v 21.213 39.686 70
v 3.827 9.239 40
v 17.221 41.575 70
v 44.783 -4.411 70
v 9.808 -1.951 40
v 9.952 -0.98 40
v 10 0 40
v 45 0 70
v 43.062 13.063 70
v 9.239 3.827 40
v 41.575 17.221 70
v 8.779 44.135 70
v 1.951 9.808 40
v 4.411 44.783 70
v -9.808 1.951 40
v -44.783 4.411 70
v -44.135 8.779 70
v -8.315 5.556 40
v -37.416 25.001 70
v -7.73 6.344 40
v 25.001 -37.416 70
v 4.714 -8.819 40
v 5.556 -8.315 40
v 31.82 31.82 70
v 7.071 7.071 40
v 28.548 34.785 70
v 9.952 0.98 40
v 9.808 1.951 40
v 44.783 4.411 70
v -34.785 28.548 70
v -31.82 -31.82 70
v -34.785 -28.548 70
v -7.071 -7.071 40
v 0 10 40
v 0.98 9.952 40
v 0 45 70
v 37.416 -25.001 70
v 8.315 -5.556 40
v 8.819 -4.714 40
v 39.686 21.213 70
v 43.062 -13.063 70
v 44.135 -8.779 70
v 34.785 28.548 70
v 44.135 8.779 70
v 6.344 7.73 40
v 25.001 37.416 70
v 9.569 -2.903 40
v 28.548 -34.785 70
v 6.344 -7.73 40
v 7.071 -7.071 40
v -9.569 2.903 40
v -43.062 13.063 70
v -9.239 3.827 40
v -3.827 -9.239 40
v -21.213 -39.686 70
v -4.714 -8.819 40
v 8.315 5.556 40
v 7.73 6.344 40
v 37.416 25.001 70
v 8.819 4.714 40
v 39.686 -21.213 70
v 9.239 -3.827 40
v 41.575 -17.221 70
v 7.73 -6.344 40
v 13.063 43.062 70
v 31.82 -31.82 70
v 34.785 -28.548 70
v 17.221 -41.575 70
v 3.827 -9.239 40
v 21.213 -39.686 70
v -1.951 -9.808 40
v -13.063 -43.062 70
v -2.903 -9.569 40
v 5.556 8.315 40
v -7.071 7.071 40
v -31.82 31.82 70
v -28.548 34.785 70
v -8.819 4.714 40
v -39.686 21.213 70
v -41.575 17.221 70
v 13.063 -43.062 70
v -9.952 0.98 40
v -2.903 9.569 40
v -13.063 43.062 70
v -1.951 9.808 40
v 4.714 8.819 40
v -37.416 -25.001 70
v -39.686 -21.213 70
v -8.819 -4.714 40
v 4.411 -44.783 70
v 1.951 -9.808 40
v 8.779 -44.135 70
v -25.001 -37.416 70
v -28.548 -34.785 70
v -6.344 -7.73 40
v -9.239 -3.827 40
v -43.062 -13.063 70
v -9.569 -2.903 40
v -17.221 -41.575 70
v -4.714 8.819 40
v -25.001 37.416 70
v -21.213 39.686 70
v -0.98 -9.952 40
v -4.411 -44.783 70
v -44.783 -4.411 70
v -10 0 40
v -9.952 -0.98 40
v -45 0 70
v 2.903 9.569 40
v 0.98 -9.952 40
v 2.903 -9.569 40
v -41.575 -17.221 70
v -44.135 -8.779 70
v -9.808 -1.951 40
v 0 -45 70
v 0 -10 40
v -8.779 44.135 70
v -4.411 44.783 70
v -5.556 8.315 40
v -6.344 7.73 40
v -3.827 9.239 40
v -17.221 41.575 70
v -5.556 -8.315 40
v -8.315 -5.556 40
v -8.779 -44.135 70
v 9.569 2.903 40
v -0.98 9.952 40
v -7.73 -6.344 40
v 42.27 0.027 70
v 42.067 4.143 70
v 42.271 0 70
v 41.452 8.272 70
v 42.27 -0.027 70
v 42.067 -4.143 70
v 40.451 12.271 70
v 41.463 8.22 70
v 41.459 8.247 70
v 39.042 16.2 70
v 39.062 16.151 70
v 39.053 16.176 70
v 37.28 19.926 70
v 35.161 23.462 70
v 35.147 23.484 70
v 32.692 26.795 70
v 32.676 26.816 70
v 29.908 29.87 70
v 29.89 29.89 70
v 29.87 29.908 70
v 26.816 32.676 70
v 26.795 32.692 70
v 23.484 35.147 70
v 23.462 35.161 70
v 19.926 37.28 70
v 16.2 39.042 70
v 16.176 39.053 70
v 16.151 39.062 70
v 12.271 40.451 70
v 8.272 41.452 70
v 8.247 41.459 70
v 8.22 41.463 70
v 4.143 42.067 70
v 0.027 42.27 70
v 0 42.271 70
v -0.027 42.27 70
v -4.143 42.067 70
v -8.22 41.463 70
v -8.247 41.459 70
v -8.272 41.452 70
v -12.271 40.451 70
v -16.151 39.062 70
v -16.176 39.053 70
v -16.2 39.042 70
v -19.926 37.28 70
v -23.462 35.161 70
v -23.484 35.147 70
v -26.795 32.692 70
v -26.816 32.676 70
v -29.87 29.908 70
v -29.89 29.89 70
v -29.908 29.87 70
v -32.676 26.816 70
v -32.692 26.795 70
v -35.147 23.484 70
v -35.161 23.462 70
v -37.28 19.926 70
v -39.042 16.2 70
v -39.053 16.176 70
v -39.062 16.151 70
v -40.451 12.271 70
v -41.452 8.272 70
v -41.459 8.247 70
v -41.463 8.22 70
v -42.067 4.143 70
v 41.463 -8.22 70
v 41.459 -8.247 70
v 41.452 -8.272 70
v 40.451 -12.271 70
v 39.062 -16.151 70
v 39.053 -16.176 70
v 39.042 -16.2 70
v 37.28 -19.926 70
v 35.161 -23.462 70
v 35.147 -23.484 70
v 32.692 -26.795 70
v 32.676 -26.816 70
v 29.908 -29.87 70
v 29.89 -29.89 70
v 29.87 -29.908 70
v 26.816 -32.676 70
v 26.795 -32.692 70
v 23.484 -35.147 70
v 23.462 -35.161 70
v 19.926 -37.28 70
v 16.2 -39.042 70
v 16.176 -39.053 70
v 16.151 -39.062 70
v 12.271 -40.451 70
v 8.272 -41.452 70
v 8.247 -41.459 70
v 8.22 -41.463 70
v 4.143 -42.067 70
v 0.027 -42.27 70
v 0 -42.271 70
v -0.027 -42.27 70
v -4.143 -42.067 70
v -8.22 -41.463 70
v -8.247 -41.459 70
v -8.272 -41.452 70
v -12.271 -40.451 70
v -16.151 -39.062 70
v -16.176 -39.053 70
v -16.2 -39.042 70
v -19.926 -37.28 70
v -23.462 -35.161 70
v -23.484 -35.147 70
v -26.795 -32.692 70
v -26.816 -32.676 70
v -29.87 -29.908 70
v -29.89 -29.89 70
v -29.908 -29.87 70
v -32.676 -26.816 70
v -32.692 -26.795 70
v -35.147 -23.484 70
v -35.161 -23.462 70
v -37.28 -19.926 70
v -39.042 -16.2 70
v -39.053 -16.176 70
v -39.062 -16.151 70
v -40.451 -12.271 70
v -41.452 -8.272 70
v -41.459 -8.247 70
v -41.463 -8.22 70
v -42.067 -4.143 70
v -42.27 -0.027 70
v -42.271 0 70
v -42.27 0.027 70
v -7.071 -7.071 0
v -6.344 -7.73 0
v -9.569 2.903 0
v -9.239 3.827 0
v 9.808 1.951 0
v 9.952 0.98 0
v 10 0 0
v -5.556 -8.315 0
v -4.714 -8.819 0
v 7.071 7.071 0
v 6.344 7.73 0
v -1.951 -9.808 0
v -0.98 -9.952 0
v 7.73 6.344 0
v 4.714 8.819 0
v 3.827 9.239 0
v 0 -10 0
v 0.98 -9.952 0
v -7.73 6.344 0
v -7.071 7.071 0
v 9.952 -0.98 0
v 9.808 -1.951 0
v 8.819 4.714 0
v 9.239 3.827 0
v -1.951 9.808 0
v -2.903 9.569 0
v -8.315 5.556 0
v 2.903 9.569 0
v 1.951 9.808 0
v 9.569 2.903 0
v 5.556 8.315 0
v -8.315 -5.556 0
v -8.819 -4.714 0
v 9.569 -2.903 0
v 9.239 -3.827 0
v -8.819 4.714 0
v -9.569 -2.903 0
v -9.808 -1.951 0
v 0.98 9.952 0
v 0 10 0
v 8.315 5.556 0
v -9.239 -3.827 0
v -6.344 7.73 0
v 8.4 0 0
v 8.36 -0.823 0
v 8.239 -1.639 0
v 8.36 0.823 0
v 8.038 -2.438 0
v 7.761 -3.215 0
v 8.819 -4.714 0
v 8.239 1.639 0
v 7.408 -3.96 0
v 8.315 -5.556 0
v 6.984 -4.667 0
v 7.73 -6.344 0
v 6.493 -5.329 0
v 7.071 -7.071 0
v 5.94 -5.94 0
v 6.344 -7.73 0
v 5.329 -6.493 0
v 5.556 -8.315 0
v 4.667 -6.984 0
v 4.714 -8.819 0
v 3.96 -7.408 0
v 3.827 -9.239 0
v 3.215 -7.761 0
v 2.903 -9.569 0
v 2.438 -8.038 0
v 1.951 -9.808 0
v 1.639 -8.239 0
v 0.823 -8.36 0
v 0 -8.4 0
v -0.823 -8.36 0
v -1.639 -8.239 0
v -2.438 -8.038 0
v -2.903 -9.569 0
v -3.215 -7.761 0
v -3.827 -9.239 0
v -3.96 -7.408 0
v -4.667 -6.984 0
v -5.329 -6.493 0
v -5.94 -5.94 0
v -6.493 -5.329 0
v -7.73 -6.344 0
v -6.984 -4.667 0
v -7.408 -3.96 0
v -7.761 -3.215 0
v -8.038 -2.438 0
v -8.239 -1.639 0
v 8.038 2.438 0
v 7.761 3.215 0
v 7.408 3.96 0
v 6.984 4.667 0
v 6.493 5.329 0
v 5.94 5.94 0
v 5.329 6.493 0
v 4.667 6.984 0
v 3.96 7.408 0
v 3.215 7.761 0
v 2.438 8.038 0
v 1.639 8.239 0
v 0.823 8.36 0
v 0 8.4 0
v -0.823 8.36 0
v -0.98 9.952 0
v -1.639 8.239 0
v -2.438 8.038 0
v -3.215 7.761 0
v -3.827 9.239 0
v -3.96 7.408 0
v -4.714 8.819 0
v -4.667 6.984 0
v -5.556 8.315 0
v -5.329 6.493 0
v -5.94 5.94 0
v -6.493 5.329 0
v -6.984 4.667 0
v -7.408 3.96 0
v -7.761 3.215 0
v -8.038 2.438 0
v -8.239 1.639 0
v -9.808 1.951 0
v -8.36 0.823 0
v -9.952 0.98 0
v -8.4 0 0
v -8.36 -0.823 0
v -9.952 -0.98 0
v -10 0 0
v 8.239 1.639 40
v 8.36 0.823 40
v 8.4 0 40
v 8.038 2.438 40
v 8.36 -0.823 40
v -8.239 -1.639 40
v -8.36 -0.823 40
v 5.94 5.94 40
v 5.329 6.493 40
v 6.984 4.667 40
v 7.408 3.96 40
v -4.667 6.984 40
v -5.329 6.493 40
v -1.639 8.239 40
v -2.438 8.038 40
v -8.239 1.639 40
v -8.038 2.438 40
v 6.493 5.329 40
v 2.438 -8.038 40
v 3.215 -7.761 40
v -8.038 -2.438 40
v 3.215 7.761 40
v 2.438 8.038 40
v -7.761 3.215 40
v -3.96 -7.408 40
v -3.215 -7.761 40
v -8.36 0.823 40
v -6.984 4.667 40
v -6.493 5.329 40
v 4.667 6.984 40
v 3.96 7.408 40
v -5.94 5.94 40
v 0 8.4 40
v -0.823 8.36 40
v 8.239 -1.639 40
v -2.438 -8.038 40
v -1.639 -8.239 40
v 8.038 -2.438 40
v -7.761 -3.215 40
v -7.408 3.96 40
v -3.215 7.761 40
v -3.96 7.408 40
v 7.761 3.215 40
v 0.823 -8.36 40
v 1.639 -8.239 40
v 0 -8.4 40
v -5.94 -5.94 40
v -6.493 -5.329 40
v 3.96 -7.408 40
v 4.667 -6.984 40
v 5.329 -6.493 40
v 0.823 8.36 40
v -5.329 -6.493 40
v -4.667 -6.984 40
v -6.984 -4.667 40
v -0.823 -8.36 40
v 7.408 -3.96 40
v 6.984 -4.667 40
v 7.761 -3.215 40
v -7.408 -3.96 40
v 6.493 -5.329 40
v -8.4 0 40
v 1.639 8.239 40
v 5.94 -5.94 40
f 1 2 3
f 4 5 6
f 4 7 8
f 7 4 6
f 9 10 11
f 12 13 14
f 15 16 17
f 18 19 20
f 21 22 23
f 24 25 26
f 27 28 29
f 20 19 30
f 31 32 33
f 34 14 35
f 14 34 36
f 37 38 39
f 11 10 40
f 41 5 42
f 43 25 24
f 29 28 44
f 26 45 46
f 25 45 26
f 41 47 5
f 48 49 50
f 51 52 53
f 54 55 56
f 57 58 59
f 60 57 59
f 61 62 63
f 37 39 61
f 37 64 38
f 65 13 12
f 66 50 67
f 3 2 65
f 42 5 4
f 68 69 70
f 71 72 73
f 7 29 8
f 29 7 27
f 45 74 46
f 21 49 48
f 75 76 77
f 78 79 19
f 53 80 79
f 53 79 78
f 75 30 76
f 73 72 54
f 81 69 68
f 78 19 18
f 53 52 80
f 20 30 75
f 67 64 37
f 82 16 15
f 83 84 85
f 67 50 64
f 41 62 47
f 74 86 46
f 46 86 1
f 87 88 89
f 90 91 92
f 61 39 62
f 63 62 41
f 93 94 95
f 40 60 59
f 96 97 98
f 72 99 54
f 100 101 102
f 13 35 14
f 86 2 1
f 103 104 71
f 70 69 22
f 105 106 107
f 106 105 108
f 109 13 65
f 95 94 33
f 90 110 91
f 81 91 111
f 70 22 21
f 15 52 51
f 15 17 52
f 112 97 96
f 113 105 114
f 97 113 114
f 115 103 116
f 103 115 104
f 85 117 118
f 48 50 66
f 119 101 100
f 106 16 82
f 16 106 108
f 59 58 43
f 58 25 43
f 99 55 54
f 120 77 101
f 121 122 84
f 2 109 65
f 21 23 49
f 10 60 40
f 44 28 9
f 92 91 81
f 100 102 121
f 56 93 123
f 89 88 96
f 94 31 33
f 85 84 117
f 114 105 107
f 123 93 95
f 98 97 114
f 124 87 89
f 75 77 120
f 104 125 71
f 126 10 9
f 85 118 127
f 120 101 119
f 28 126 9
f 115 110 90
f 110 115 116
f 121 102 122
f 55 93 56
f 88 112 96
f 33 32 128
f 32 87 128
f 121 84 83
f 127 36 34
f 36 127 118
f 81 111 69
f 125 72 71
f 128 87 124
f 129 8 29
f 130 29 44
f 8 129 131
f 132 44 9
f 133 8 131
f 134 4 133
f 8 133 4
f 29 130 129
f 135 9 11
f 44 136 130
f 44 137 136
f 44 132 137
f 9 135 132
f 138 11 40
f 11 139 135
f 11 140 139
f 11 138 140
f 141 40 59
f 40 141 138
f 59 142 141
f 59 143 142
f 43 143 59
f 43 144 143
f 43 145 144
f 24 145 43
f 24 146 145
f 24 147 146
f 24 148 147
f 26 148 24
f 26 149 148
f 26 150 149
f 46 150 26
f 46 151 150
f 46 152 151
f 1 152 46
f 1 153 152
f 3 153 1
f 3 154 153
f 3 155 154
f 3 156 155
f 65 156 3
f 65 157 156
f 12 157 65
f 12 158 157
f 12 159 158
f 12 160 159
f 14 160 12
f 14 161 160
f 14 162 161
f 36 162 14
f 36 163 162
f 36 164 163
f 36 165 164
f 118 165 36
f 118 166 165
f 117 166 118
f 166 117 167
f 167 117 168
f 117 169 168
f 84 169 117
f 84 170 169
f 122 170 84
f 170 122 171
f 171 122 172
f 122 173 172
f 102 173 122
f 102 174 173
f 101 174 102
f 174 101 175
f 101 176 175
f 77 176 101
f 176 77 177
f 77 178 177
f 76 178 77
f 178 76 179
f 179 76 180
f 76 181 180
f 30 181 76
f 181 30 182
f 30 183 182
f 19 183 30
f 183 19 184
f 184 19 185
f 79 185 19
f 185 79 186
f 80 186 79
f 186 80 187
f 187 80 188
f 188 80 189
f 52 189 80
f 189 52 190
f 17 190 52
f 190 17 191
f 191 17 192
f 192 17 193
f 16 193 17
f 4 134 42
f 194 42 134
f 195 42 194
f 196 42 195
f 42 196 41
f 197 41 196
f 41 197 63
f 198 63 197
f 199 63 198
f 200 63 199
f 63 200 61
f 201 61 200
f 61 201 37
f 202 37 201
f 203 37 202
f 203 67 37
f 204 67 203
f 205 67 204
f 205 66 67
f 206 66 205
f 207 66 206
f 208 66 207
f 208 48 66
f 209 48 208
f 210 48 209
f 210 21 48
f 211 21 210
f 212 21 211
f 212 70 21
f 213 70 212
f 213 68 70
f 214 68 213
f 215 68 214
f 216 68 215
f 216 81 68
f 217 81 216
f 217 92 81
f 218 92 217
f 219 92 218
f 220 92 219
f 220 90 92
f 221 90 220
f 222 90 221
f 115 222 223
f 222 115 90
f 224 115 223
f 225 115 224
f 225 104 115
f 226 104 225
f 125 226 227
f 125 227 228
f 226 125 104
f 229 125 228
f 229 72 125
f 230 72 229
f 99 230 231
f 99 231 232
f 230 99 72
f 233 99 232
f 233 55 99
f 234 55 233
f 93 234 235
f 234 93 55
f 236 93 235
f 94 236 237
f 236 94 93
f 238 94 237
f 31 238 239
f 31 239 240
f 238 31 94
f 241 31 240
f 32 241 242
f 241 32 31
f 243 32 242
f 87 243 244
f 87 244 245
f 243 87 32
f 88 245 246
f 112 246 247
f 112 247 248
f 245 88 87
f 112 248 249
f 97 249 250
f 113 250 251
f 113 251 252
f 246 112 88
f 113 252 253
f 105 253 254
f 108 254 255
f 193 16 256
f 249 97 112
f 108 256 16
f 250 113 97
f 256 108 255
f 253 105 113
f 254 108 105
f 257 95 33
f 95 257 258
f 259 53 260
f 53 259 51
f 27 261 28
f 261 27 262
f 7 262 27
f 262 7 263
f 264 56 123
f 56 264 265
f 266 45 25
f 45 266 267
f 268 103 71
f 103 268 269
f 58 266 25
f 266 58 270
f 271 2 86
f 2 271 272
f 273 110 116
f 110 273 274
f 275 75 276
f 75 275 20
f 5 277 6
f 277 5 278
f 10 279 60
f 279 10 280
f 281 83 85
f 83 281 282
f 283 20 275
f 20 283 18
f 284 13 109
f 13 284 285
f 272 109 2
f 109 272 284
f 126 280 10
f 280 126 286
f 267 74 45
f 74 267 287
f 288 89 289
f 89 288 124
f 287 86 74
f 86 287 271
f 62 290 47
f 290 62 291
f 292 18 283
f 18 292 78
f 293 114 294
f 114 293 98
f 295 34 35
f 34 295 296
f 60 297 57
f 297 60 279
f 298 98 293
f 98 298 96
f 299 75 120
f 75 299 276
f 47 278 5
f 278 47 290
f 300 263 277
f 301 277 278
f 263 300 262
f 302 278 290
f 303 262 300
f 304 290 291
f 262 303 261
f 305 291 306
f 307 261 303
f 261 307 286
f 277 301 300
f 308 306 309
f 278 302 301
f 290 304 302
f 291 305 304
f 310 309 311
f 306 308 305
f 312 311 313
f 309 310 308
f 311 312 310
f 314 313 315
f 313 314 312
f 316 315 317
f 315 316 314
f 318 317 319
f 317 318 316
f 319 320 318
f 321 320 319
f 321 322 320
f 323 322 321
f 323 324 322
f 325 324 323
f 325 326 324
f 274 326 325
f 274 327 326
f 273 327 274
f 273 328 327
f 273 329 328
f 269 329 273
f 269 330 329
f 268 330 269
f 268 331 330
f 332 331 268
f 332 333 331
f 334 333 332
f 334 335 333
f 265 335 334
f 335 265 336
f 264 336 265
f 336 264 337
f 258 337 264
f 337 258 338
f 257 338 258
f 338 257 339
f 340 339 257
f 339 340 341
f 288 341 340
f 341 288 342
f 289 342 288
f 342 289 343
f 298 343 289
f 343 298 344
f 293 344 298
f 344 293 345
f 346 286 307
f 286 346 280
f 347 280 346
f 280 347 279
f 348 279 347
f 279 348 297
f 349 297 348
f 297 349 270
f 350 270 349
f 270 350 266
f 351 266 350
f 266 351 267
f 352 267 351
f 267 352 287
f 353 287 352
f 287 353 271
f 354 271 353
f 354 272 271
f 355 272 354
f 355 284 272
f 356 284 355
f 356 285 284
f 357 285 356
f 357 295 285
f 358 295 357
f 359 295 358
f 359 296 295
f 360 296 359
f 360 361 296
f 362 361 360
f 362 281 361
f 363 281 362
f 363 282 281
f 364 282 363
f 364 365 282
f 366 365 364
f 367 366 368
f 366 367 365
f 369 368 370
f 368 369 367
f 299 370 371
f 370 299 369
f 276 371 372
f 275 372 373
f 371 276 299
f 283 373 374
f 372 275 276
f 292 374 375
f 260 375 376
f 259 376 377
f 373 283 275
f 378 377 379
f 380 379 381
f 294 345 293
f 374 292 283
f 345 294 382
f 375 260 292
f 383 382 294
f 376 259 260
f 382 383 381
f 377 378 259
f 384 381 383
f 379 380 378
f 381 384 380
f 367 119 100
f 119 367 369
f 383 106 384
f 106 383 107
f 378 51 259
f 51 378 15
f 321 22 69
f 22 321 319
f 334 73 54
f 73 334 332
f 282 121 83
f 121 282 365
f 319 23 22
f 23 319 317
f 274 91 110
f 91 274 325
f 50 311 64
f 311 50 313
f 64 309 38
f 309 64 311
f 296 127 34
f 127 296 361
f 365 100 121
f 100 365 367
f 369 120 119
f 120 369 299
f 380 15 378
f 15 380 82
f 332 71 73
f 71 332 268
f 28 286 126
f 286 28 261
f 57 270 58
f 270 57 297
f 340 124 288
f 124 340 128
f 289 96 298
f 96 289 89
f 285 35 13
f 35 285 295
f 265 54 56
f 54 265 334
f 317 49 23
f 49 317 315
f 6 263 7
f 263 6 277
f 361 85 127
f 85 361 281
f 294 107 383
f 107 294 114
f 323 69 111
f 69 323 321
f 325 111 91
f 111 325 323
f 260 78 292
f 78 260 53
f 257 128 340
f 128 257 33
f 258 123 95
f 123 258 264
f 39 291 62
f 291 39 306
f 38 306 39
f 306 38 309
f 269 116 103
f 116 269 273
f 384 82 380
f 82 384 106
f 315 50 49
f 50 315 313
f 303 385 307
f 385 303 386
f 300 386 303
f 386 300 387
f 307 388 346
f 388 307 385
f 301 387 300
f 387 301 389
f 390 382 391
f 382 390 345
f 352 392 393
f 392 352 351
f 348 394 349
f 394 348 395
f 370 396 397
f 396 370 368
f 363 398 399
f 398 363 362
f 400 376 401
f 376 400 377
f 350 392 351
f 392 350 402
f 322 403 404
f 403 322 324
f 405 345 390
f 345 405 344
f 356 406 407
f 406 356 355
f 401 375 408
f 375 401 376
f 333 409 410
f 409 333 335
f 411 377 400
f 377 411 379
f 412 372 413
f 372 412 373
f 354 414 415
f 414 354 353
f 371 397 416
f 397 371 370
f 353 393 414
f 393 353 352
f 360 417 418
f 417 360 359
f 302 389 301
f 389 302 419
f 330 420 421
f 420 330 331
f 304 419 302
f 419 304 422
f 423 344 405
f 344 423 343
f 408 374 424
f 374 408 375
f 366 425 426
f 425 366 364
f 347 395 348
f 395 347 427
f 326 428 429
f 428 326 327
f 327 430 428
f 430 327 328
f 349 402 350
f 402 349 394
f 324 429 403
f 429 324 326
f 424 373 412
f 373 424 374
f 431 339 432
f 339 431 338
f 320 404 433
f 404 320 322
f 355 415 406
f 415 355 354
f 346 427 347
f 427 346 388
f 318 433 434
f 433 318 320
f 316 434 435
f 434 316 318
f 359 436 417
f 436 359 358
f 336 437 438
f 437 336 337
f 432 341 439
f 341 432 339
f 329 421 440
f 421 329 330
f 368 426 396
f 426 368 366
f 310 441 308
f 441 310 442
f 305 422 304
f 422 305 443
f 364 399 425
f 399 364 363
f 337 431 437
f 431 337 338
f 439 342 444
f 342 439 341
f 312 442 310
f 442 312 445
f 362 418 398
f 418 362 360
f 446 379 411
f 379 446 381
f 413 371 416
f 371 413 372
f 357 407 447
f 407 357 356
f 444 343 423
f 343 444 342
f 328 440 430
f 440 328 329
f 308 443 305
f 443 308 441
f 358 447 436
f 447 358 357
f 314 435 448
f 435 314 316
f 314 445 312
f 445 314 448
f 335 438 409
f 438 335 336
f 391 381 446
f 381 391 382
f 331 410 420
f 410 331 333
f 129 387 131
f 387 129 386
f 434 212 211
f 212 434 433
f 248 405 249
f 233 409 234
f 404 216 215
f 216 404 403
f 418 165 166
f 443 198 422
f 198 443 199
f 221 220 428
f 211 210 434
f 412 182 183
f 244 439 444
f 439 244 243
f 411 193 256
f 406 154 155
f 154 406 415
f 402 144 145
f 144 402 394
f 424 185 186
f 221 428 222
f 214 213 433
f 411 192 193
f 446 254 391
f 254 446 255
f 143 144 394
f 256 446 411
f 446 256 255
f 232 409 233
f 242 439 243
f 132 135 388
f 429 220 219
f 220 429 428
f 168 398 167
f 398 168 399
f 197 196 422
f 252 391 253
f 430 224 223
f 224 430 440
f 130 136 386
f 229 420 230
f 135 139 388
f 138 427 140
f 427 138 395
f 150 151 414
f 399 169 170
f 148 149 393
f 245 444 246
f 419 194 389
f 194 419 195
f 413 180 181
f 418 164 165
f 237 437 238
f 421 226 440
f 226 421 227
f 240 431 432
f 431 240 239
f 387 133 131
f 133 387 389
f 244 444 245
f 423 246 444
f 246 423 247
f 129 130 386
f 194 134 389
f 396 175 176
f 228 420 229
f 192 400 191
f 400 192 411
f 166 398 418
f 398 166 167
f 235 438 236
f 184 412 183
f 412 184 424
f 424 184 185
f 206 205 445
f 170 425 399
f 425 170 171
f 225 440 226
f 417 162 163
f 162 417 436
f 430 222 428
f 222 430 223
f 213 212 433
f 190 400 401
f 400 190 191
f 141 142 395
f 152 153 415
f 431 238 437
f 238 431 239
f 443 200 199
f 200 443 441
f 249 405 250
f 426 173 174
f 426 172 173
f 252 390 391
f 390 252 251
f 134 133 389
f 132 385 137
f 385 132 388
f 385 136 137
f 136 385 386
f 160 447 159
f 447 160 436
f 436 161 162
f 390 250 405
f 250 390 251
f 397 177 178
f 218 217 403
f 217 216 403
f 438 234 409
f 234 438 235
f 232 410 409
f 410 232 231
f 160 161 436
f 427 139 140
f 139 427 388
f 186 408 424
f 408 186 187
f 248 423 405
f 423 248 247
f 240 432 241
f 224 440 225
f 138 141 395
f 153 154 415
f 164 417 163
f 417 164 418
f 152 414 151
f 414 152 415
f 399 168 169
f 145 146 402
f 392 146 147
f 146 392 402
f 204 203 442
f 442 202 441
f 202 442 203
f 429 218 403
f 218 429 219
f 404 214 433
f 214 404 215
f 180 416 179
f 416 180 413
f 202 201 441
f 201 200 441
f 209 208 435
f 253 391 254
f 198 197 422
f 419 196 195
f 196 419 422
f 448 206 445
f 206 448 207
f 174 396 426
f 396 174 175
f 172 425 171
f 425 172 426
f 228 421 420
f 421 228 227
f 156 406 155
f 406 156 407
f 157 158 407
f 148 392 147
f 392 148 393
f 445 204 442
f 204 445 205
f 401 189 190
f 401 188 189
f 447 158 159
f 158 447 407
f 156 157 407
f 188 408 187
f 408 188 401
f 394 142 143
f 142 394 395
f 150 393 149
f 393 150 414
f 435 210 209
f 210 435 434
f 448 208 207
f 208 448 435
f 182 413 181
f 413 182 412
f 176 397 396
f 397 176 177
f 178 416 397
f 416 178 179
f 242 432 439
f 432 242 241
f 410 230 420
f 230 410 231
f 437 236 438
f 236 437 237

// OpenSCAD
// Funnel - a conical mouth narrowing into a straight spout, hollow with a constant wall. NOVEL
// general part (a generic funnel, not any one labware item).
//
// @desc hollow funnel: conical mouth into a straight spout
// @prompt Design a funnel in OpenSCAD: a cone {top} mm across the mouth narrowing over {cone_h} mm to a spout {spout_d} mm across and {spout_l} mm long, with a {wall} mm wall throughout. Reply with a single complete OpenSCAD file.
// @param top     mouth diameter, mm   [30:90]
// @param spout_d spout diameter, mm   [6:20]
// @param cone_h  cone height, mm      [20:60]
// @param spout_l spout length, mm     [10:40]
// @param wall    wall thickness, mm   [1.2:3]

top     = 90;
spout_d = 20;
cone_h  = 30;
spout_l = 40;
wall    = 1.6;

$fn = 64;

ib = max(1.6, spout_d - 2 * wall);   // keep the spout bore open even if the wall is thick

translate([0, 0, spout_l])          // rest the spout tip on the bed (z = 0)
difference() {
    union() {
        cylinder(h = cone_h, d1 = spout_d, d2 = top);                 // cone: spout end up to mouth
        translate([0, 0, -spout_l]) cylinder(h = spout_l + 0.01, d = spout_d);   // spout below
    }
    translate([0, 0, -spout_l - 1])
        cylinder(h = spout_l + 1 + 0.01, d = ib);                     // bore through the spout
    cylinder(h = cone_h + 1, d1 = ib, d2 = top - 2 * wall);           // inner cone, open mouth
}
